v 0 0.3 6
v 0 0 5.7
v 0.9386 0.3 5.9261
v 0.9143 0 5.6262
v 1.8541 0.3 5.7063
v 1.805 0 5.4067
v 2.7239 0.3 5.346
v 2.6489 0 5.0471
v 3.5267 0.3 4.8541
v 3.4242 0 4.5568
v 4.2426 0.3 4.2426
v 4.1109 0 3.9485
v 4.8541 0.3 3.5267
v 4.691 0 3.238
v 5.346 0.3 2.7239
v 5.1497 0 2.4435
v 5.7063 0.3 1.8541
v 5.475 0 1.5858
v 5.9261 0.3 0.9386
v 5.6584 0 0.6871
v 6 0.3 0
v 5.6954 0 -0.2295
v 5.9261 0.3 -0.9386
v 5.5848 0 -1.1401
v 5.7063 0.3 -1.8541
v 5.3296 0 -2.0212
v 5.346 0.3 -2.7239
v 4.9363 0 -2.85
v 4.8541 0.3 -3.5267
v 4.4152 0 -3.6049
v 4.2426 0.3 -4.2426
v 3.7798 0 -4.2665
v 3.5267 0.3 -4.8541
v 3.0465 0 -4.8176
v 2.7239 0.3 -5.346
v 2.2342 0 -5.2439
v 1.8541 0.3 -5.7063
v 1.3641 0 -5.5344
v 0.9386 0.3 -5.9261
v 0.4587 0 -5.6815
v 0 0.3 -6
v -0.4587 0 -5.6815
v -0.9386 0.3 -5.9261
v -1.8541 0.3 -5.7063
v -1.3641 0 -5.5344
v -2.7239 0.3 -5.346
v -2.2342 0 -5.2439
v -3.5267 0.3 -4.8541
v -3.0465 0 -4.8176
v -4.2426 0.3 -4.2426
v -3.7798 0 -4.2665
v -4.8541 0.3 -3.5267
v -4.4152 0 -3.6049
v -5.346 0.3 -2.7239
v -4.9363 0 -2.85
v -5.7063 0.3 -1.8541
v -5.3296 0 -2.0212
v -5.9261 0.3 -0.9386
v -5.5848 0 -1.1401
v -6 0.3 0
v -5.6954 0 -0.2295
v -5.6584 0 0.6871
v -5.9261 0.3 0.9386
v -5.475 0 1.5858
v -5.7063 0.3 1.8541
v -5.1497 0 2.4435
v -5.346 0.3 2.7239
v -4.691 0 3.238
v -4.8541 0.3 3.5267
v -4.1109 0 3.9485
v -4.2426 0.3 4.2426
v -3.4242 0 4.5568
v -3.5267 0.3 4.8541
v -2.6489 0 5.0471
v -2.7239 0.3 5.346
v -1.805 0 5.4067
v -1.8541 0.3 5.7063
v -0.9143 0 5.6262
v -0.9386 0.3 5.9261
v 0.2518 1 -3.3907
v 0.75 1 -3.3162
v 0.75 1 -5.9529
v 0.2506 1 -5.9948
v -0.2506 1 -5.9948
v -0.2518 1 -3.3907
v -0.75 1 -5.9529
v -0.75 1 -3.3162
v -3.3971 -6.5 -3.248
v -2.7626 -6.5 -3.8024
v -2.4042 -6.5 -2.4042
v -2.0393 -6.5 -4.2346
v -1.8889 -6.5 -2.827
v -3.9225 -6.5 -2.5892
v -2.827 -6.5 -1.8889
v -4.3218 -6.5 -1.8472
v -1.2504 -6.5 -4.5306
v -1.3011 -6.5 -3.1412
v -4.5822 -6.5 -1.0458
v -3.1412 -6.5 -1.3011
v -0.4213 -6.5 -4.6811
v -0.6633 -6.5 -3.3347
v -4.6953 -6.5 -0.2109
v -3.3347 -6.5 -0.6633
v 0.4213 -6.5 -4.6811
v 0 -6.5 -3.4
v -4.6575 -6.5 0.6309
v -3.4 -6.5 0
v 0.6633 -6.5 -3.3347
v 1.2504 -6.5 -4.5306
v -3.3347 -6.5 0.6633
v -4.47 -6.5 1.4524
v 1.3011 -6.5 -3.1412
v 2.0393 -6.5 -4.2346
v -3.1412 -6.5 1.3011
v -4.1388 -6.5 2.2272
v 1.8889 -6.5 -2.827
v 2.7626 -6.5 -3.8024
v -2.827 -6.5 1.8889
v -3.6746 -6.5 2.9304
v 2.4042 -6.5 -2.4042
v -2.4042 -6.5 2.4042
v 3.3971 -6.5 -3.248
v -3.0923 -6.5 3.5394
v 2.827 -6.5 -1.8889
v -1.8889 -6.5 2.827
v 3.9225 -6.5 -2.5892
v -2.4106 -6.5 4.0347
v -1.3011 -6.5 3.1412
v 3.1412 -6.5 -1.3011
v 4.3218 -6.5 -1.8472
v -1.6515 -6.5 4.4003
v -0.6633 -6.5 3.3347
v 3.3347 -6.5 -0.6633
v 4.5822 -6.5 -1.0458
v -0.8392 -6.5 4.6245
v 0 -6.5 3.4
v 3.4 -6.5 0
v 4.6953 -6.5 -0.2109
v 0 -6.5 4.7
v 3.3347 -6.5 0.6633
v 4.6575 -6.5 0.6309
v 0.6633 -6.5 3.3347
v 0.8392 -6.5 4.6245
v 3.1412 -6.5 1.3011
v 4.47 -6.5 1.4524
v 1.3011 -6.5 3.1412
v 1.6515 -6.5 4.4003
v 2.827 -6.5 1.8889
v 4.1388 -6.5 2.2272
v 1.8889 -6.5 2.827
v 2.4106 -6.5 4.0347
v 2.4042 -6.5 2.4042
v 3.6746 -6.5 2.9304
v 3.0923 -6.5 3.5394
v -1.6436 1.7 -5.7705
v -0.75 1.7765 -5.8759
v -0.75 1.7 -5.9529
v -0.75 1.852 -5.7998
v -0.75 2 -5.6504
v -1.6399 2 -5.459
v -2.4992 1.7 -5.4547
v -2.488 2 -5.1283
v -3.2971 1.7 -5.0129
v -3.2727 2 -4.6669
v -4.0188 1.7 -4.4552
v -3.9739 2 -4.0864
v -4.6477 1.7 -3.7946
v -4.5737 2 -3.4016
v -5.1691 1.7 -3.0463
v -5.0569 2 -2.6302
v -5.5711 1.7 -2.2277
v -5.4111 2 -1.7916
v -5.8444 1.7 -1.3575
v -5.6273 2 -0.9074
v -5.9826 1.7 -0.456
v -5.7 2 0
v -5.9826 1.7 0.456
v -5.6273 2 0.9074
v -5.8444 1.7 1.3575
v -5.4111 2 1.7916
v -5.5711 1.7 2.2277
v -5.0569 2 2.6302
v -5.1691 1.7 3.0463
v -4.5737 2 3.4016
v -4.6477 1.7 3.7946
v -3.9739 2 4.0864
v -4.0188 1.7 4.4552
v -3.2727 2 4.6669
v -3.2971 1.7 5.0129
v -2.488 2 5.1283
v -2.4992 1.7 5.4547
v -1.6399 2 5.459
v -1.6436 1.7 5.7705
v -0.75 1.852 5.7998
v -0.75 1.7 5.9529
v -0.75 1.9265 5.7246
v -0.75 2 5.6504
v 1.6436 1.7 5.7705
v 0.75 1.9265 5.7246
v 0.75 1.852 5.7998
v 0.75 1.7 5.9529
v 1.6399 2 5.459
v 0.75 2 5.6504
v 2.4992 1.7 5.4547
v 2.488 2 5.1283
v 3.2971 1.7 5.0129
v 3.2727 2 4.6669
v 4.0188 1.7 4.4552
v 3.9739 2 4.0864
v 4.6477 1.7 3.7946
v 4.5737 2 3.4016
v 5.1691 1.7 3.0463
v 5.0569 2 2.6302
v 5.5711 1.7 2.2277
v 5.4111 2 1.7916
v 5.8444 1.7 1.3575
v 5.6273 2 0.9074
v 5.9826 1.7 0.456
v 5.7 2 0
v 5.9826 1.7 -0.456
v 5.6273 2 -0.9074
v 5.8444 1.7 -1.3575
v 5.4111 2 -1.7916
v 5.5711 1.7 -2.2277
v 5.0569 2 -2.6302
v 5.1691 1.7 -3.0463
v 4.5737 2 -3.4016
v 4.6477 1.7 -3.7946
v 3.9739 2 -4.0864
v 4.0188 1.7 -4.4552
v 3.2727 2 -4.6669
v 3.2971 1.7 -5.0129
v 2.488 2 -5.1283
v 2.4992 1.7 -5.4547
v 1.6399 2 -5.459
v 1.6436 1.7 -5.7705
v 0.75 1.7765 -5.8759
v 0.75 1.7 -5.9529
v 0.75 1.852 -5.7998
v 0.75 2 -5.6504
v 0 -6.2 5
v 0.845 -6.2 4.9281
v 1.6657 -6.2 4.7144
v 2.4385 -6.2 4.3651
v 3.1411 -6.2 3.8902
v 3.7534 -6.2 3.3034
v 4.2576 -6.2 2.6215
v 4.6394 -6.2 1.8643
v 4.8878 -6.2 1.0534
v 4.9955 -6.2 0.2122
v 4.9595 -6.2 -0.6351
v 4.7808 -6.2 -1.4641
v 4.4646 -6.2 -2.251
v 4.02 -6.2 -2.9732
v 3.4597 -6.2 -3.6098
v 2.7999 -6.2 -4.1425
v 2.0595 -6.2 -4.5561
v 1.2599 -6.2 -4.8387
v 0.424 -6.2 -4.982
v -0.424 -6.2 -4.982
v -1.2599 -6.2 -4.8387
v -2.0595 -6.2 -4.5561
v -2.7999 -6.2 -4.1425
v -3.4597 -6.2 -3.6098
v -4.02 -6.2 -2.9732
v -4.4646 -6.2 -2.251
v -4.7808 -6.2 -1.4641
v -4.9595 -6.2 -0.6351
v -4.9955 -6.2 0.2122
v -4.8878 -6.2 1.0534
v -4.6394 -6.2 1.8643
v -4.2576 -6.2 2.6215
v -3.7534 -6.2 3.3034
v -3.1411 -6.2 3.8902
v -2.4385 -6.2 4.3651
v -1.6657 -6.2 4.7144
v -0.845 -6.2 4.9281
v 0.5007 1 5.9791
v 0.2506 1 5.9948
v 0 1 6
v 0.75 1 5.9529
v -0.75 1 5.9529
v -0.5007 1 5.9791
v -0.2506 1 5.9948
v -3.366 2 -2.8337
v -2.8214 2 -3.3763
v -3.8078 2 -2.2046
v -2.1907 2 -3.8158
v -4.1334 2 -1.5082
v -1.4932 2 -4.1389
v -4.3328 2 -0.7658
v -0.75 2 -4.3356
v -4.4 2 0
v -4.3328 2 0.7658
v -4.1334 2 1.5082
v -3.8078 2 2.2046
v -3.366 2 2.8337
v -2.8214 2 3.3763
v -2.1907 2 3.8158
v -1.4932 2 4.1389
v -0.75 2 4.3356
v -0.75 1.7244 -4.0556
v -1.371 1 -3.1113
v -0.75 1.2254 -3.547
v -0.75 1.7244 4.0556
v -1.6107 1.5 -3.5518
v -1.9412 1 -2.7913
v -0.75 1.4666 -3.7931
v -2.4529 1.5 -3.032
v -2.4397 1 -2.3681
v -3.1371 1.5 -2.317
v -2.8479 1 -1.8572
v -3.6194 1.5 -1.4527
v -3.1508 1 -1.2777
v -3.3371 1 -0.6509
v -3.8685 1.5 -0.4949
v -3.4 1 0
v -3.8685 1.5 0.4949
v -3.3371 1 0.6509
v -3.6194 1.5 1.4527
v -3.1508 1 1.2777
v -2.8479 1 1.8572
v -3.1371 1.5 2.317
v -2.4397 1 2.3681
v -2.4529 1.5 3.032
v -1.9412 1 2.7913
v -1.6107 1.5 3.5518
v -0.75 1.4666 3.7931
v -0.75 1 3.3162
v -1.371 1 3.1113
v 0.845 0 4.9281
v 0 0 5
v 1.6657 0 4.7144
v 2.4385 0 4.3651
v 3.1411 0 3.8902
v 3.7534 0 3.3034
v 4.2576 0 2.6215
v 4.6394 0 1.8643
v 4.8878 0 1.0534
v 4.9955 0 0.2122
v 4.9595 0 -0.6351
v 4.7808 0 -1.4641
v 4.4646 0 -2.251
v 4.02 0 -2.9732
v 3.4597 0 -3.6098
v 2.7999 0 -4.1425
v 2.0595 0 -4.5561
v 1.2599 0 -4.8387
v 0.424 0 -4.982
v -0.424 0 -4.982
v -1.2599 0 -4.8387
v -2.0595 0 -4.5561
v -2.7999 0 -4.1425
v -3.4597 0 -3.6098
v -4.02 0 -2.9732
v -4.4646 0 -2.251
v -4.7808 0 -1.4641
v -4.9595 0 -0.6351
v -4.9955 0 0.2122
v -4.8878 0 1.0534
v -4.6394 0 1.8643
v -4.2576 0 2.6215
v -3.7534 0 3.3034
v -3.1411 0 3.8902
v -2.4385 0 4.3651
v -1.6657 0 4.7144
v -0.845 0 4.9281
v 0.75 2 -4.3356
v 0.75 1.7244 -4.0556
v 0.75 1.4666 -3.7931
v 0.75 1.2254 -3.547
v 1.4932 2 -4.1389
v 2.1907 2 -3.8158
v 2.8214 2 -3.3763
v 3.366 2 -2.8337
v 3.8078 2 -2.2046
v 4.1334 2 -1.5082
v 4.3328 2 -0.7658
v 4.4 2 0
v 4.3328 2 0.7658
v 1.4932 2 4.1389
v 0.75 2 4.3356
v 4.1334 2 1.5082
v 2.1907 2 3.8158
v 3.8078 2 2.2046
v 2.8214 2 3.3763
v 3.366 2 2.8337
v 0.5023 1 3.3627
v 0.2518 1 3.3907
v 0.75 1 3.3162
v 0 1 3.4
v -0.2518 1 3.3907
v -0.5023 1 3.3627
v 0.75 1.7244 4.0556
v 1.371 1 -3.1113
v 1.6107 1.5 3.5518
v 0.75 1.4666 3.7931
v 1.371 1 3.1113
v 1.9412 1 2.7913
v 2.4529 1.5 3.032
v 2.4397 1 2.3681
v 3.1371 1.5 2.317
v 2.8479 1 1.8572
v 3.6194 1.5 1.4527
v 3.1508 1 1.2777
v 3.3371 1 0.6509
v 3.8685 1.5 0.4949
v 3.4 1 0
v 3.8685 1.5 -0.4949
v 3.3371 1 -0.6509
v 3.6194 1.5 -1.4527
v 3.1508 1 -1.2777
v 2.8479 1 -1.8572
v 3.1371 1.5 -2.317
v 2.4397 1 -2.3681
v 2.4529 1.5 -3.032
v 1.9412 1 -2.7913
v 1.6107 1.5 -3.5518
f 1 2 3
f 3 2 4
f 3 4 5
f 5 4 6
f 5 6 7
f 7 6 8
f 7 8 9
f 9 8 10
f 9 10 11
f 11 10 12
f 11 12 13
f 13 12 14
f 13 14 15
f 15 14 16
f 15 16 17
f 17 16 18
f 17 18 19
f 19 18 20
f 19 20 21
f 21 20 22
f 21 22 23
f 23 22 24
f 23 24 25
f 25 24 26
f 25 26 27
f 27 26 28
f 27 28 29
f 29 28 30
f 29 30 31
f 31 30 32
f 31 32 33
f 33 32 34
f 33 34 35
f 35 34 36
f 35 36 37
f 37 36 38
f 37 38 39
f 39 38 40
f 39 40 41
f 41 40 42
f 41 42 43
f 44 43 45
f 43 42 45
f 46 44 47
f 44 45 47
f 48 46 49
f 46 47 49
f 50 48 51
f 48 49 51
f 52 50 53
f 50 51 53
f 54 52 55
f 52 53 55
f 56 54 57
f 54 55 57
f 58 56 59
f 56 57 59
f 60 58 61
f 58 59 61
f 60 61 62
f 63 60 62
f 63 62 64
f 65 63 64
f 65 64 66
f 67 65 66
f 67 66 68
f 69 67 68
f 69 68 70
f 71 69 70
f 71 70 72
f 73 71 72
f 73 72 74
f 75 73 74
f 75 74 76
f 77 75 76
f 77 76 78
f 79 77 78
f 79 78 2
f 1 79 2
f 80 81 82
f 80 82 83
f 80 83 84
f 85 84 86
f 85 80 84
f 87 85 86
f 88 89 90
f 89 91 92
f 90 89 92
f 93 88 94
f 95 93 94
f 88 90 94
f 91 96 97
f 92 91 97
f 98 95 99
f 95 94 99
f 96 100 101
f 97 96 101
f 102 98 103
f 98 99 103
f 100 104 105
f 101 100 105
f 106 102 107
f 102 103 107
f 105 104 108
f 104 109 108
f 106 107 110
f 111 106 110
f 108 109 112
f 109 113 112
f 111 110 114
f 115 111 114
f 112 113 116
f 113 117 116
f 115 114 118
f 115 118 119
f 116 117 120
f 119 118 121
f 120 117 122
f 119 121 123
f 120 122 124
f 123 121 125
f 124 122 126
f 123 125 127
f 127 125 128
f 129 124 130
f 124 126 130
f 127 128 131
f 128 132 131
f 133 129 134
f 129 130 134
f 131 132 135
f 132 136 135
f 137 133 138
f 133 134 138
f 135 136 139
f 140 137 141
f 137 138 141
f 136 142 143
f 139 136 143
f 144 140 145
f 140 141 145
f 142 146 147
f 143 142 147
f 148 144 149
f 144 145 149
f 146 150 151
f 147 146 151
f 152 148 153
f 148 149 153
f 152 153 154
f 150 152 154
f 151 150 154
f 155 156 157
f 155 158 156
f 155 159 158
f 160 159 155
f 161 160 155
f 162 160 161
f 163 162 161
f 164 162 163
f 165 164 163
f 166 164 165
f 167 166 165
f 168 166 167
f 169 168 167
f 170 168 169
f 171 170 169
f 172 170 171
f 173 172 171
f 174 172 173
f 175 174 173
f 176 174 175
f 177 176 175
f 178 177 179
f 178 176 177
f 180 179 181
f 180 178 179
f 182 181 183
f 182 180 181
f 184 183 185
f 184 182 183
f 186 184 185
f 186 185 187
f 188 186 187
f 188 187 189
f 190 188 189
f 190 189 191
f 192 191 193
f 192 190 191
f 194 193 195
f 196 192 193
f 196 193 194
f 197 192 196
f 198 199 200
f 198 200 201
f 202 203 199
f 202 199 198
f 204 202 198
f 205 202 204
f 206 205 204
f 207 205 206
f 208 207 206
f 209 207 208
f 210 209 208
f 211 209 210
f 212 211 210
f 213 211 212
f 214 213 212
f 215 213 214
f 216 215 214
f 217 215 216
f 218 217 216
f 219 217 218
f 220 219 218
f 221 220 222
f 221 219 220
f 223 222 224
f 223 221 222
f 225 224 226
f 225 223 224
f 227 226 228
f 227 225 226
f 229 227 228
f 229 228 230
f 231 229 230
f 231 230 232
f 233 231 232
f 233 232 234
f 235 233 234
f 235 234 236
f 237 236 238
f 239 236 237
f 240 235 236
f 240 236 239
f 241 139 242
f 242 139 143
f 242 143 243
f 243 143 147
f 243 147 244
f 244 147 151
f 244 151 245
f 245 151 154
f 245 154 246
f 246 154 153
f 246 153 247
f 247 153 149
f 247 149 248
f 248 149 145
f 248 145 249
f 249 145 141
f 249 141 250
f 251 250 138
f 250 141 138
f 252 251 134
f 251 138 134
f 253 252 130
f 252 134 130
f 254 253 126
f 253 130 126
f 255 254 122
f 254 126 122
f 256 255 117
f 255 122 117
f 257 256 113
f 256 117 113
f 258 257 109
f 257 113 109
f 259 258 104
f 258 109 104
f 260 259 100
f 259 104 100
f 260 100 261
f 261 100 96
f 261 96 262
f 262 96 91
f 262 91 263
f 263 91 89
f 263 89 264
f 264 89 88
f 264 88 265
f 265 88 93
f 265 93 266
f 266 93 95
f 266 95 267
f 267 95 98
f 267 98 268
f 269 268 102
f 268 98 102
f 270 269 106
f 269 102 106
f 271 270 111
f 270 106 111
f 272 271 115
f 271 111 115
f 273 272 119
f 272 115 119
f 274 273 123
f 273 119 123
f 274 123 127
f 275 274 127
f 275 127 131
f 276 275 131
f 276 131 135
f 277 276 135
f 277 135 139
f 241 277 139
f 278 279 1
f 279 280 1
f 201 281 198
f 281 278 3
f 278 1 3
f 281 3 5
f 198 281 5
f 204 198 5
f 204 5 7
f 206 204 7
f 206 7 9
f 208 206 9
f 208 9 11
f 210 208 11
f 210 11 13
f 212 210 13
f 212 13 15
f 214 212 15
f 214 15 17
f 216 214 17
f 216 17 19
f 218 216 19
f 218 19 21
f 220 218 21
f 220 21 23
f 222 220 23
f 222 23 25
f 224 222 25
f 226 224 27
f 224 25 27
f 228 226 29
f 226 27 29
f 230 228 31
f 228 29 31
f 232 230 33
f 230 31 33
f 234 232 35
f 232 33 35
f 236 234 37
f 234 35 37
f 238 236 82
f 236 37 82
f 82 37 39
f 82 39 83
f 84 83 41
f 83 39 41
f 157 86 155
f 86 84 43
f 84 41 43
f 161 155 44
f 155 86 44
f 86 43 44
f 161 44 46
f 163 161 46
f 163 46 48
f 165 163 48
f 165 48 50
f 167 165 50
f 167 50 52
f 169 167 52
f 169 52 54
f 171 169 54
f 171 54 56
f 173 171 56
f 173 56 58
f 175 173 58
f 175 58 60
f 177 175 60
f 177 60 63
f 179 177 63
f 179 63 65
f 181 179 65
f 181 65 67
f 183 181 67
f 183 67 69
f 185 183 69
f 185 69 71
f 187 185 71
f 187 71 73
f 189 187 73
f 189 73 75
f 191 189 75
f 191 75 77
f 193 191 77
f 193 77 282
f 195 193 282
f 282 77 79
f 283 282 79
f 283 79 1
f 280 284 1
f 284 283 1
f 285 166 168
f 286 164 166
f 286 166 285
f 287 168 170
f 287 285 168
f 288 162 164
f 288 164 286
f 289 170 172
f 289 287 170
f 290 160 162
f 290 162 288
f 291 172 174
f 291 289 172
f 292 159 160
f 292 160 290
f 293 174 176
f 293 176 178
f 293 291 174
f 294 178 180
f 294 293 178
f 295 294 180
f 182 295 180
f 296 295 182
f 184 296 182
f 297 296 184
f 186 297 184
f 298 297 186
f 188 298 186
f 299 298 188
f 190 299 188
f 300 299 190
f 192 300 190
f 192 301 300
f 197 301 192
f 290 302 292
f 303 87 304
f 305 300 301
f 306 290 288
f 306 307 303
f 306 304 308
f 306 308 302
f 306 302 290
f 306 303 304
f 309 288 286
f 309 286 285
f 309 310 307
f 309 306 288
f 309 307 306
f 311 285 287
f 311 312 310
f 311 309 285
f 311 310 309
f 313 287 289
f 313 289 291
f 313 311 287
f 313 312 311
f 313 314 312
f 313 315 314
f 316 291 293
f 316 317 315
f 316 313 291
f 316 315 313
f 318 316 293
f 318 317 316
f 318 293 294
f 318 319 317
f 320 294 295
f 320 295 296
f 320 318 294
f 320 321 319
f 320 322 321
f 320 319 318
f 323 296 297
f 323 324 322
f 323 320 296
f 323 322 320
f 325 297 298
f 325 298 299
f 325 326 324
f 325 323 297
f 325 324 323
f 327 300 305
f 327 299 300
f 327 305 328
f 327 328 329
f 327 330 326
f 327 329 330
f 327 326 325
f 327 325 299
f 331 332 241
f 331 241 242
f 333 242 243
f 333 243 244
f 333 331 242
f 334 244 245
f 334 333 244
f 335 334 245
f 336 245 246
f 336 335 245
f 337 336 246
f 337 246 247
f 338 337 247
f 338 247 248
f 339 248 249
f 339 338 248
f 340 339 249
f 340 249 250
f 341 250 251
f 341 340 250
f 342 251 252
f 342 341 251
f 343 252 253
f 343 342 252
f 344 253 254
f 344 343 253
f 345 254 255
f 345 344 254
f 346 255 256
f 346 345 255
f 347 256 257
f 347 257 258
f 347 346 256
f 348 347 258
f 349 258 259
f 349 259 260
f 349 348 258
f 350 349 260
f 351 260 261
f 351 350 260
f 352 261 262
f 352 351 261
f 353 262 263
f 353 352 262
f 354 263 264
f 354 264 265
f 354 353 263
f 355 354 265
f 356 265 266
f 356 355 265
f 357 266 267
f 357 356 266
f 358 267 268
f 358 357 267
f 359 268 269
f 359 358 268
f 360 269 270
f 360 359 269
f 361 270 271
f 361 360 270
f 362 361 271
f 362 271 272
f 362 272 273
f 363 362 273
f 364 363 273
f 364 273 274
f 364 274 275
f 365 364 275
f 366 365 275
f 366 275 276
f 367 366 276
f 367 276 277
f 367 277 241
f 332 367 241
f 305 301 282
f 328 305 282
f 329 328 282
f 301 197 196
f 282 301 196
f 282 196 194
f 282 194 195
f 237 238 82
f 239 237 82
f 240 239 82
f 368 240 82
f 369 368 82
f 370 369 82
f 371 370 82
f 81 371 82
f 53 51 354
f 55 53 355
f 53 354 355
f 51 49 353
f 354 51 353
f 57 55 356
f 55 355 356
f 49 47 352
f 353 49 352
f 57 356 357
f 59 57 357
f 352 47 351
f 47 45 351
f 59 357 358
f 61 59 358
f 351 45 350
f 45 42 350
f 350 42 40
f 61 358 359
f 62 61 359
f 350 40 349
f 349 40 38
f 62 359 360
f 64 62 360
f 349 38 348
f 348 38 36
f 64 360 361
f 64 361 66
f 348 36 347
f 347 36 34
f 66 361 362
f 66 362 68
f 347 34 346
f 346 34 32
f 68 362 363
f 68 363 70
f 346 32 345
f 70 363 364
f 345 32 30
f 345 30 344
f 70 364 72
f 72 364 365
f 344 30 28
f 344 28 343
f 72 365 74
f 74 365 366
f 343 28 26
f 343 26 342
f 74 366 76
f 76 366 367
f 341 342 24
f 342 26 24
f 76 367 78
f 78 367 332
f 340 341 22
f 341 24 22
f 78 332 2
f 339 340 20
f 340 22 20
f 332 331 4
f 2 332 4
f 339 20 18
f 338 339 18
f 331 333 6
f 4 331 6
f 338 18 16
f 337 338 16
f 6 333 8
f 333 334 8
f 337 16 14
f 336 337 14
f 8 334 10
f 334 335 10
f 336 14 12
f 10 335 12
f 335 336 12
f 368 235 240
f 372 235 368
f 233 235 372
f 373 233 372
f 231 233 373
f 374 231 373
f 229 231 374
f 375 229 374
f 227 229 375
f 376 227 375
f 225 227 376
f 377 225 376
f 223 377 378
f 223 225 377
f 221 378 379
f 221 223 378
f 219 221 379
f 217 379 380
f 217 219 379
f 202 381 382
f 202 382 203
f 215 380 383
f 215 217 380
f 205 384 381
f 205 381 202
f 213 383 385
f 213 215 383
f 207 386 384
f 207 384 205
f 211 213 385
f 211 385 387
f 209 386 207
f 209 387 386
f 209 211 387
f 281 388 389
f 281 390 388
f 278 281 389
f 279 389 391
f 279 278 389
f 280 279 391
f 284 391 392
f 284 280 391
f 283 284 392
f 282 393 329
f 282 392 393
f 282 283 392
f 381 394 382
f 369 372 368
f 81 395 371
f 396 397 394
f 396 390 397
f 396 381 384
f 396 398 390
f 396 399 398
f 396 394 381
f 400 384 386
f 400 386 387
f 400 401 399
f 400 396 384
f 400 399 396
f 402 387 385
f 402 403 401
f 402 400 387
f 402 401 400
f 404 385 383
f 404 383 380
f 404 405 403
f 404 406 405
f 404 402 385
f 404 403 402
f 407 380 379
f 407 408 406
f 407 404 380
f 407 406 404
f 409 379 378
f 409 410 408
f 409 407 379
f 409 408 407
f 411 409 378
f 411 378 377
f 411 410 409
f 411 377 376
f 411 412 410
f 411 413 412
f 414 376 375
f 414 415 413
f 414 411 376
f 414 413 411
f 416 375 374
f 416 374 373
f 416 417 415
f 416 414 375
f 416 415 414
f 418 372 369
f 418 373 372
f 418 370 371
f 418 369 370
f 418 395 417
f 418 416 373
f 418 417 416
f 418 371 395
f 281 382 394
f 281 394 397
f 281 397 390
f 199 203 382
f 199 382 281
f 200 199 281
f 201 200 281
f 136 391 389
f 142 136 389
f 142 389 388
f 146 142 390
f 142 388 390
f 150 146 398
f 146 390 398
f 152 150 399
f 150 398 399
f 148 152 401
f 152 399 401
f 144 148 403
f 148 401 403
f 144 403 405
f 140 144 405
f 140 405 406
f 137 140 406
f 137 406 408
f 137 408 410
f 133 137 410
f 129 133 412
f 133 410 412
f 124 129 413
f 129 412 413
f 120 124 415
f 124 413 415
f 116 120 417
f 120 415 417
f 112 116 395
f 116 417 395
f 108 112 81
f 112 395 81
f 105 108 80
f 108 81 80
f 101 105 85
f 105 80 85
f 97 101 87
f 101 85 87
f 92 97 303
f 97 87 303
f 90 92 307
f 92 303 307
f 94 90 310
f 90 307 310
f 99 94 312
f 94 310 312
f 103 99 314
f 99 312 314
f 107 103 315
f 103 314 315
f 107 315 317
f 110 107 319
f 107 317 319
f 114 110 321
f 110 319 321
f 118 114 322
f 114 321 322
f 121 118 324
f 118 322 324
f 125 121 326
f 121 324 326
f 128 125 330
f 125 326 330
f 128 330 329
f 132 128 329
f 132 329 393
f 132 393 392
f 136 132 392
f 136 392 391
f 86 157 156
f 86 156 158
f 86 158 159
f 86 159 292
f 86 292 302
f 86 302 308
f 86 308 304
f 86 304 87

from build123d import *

# Parameters (mm, degrees)
ESQUISSE1_R             = 5
EXTRUSION1_DEPTH        = 6.5
ESQUISSE2_R             = 6
EXTRUSION2_DEPTH        = 2
ESQUISSE3_R             = 3.4
ENL_V_MAT_EXTRU_1_DEPTH = 9.5
CHANFREIN1_SIZE         = 0.3
CHANFREIN2_SIZE         = 1
ESQUISSE4_W             = 1.5
ESQUISSE4_H             = 12
ENL_V_MAT_EXTRU_2_DEPTH = 1


with BuildPart() as part:
    # Esquisse1 → Extrusion1 (new body)
    with BuildSketch(Plane(origin=(0, 0, 0), x_dir=(1, 0, 0), z_dir=(0, 1, 0))):
        with Locations(Location((0, 0, 0), (0, 0, 270))):  # turned: the seam where the file's is
            Circle(ESQUISSE1_R)
    extrude(amount=-EXTRUSION1_DEPTH)

    # Esquisse2 → Extrusion2 (add)
    with BuildSketch(Plane(origin=(0, 0, 0), x_dir=(-1, 0, 0), z_dir=(0, 1, 0))):
        with Locations(Location((0, 0, 0), (0, 0, 90))):  # turned: the seam where the file's is
            Circle(ESQUISSE2_R)
    extrude(amount=EXTRUSION2_DEPTH)

    # Esquisse3 → Enlèv. mat.-Extru.1 (cut, through all)
    with BuildSketch(Plane(origin=(0, 2, 0), x_dir=(-1, 0, 0), z_dir=(0, 1, 0))):
        with Locations(Location((0, 0, 0), (0, 0, 90))):  # turned: the seam where the file's is
            Circle(ESQUISSE3_R)
    extrude(amount=-ENL_V_MAT_EXTRU_1_DEPTH, mode=Mode.SUBTRACT)

    # Chanfrein1
    chanfrein1_edges = [part.edges().sort_by_distance(p)[0] for p in [
        (0, -6.5, -5),
        (0, 0, -6),
        (0, 2, -6),
    ]]
    chamfer(chanfrein1_edges, length=CHANFREIN1_SIZE)

    # Chanfrein2
    chanfrein2_edges = [part.edges().sort_by_distance(p)[0] for p in [
        (0, 2, -3.4),
    ]]
    chamfer(chanfrein2_edges, length=CHANFREIN2_SIZE)

    # Esquisse4 → Enlèv. mat.-Extru.2 (cut)
    with BuildSketch(Plane(origin=(0, 2, 0), x_dir=(-1, 0, 0), z_dir=(0, 1, 0))):
        Rectangle(ESQUISSE4_W, ESQUISSE4_H)
    extrude(amount=-ENL_V_MAT_EXTRU_2_DEPTH, mode=Mode.SUBTRACT)


solid = part.part
